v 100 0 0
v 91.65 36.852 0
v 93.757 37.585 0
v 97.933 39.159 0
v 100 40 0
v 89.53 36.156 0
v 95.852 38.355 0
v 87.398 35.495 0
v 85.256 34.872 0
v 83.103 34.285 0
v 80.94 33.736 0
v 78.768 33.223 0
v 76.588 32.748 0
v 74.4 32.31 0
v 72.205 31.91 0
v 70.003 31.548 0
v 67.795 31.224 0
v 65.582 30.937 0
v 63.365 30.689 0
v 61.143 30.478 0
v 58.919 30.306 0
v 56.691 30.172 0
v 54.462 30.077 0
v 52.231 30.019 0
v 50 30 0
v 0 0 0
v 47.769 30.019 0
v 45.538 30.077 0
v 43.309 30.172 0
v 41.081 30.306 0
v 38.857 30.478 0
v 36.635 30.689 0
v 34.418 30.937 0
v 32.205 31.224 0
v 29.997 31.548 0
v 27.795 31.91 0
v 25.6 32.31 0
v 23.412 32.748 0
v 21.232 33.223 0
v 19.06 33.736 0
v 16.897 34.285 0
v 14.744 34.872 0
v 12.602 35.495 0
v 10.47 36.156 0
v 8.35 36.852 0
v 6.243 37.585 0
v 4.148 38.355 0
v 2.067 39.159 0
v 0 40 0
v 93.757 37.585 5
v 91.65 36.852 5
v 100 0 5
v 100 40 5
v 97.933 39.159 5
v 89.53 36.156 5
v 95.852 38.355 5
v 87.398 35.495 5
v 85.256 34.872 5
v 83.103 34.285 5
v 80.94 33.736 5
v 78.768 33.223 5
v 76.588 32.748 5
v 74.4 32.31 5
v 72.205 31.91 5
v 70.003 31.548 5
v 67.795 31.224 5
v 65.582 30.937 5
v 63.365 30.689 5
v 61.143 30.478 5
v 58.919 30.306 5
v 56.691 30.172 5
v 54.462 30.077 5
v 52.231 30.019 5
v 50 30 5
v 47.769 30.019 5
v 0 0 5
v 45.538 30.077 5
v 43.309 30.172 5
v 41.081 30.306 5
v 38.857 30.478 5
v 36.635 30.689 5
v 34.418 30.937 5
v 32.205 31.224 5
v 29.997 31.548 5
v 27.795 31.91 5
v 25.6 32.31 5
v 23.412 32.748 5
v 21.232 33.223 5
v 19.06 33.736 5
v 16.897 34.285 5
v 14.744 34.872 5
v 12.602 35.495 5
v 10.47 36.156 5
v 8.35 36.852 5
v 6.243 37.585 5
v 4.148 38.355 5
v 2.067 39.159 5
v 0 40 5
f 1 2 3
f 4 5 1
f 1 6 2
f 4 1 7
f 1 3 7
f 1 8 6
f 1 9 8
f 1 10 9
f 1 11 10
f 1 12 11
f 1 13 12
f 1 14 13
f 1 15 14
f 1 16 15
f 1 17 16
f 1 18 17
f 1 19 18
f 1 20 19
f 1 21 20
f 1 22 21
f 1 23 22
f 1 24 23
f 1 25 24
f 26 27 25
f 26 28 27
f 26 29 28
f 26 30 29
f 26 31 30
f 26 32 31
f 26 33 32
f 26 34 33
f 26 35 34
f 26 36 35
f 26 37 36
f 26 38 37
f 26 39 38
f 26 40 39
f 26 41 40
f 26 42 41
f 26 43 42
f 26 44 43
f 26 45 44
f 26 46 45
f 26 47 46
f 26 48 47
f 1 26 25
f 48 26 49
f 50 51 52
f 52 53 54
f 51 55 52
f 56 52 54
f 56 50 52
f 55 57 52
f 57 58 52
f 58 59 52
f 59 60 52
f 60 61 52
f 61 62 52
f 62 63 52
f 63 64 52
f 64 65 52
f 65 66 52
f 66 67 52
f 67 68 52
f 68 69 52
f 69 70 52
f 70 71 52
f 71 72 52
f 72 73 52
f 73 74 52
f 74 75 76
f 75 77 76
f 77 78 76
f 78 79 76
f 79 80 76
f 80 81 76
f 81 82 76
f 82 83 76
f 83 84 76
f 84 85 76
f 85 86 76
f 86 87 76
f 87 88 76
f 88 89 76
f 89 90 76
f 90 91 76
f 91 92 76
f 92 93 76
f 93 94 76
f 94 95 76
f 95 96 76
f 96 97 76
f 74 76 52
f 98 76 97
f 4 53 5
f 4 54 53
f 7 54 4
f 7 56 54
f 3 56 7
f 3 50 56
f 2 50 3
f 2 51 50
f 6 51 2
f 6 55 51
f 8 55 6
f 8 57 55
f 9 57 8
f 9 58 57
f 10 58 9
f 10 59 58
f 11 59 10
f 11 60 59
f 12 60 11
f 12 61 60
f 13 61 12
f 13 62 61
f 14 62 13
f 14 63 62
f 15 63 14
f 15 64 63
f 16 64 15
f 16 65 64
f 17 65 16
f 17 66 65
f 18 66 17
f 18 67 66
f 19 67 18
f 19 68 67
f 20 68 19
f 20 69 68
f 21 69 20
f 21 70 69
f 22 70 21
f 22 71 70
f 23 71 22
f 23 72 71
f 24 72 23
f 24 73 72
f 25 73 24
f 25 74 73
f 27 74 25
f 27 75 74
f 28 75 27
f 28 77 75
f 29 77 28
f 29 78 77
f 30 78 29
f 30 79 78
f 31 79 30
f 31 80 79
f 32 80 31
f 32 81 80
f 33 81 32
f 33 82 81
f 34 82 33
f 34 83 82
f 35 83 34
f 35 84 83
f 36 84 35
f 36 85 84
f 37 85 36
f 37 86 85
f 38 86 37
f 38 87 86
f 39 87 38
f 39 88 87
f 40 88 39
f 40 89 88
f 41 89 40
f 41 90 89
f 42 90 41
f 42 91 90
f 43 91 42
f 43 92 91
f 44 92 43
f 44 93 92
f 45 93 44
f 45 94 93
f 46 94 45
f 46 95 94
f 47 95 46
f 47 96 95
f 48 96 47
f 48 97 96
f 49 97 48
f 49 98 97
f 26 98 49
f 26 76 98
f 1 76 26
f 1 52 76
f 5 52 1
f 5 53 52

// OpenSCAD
$fn = 32;

// ----------------------------------------------------------------------
// Arc profile plate: notch, 49 points
// ----------------------------------------------------------------------

// --- parameters (mm) ---
bar_l = 100;              // bar length, X
bar_w = 40;               // bar width, Y
notch_depth = 10;         // depth of the arc notch at mid-span
arc_r = 130;              // radius of the notch arc
arc_angle = 45.24;        // notch arc angle, degrees
arc_step = 1;             // sampling step of the notch arc, degrees
plate_t = 5;              // plate thickness, Z

profile = [[0, 0], [100, 0], [100, 40], [97.933, 39.159], [95.852, 38.355], [93.757, 37.585], [91.65, 36.852], [89.53, 36.156], [87.398, 35.495], [85.256, 34.872], [83.103, 34.285], [80.94, 33.736], [78.768, 33.223], [76.588, 32.748], [74.4, 32.31], [72.205, 31.91], [70.003, 31.548], [67.795, 31.224], [65.582, 30.937], [63.365, 30.689], [61.143, 30.478], [58.919, 30.306], [56.691, 30.172], [54.462, 30.077], [52.231, 30.019], [50, 30], [47.769, 30.019], [45.538, 30.077], [43.309, 30.172], [41.081, 30.306], [38.857, 30.478], [36.635, 30.689], [34.418, 30.937], [32.205, 31.224], [29.997, 31.548], [27.795, 31.91], [25.6, 32.31], [23.412, 32.748], [21.232, 33.223], [19.06, 33.736], [16.897, 34.285], [14.744, 34.872], [12.602, 35.495], [10.47, 36.156], [8.35, 36.852], [6.243, 37.585], [4.148, 38.355], [2.067, 39.159], [0, 40]];  // primary outline, 49 points, counter clockwise

// --- the one profile operation ---
linear_extrude(height = plate_t) polygon(points = profile);
